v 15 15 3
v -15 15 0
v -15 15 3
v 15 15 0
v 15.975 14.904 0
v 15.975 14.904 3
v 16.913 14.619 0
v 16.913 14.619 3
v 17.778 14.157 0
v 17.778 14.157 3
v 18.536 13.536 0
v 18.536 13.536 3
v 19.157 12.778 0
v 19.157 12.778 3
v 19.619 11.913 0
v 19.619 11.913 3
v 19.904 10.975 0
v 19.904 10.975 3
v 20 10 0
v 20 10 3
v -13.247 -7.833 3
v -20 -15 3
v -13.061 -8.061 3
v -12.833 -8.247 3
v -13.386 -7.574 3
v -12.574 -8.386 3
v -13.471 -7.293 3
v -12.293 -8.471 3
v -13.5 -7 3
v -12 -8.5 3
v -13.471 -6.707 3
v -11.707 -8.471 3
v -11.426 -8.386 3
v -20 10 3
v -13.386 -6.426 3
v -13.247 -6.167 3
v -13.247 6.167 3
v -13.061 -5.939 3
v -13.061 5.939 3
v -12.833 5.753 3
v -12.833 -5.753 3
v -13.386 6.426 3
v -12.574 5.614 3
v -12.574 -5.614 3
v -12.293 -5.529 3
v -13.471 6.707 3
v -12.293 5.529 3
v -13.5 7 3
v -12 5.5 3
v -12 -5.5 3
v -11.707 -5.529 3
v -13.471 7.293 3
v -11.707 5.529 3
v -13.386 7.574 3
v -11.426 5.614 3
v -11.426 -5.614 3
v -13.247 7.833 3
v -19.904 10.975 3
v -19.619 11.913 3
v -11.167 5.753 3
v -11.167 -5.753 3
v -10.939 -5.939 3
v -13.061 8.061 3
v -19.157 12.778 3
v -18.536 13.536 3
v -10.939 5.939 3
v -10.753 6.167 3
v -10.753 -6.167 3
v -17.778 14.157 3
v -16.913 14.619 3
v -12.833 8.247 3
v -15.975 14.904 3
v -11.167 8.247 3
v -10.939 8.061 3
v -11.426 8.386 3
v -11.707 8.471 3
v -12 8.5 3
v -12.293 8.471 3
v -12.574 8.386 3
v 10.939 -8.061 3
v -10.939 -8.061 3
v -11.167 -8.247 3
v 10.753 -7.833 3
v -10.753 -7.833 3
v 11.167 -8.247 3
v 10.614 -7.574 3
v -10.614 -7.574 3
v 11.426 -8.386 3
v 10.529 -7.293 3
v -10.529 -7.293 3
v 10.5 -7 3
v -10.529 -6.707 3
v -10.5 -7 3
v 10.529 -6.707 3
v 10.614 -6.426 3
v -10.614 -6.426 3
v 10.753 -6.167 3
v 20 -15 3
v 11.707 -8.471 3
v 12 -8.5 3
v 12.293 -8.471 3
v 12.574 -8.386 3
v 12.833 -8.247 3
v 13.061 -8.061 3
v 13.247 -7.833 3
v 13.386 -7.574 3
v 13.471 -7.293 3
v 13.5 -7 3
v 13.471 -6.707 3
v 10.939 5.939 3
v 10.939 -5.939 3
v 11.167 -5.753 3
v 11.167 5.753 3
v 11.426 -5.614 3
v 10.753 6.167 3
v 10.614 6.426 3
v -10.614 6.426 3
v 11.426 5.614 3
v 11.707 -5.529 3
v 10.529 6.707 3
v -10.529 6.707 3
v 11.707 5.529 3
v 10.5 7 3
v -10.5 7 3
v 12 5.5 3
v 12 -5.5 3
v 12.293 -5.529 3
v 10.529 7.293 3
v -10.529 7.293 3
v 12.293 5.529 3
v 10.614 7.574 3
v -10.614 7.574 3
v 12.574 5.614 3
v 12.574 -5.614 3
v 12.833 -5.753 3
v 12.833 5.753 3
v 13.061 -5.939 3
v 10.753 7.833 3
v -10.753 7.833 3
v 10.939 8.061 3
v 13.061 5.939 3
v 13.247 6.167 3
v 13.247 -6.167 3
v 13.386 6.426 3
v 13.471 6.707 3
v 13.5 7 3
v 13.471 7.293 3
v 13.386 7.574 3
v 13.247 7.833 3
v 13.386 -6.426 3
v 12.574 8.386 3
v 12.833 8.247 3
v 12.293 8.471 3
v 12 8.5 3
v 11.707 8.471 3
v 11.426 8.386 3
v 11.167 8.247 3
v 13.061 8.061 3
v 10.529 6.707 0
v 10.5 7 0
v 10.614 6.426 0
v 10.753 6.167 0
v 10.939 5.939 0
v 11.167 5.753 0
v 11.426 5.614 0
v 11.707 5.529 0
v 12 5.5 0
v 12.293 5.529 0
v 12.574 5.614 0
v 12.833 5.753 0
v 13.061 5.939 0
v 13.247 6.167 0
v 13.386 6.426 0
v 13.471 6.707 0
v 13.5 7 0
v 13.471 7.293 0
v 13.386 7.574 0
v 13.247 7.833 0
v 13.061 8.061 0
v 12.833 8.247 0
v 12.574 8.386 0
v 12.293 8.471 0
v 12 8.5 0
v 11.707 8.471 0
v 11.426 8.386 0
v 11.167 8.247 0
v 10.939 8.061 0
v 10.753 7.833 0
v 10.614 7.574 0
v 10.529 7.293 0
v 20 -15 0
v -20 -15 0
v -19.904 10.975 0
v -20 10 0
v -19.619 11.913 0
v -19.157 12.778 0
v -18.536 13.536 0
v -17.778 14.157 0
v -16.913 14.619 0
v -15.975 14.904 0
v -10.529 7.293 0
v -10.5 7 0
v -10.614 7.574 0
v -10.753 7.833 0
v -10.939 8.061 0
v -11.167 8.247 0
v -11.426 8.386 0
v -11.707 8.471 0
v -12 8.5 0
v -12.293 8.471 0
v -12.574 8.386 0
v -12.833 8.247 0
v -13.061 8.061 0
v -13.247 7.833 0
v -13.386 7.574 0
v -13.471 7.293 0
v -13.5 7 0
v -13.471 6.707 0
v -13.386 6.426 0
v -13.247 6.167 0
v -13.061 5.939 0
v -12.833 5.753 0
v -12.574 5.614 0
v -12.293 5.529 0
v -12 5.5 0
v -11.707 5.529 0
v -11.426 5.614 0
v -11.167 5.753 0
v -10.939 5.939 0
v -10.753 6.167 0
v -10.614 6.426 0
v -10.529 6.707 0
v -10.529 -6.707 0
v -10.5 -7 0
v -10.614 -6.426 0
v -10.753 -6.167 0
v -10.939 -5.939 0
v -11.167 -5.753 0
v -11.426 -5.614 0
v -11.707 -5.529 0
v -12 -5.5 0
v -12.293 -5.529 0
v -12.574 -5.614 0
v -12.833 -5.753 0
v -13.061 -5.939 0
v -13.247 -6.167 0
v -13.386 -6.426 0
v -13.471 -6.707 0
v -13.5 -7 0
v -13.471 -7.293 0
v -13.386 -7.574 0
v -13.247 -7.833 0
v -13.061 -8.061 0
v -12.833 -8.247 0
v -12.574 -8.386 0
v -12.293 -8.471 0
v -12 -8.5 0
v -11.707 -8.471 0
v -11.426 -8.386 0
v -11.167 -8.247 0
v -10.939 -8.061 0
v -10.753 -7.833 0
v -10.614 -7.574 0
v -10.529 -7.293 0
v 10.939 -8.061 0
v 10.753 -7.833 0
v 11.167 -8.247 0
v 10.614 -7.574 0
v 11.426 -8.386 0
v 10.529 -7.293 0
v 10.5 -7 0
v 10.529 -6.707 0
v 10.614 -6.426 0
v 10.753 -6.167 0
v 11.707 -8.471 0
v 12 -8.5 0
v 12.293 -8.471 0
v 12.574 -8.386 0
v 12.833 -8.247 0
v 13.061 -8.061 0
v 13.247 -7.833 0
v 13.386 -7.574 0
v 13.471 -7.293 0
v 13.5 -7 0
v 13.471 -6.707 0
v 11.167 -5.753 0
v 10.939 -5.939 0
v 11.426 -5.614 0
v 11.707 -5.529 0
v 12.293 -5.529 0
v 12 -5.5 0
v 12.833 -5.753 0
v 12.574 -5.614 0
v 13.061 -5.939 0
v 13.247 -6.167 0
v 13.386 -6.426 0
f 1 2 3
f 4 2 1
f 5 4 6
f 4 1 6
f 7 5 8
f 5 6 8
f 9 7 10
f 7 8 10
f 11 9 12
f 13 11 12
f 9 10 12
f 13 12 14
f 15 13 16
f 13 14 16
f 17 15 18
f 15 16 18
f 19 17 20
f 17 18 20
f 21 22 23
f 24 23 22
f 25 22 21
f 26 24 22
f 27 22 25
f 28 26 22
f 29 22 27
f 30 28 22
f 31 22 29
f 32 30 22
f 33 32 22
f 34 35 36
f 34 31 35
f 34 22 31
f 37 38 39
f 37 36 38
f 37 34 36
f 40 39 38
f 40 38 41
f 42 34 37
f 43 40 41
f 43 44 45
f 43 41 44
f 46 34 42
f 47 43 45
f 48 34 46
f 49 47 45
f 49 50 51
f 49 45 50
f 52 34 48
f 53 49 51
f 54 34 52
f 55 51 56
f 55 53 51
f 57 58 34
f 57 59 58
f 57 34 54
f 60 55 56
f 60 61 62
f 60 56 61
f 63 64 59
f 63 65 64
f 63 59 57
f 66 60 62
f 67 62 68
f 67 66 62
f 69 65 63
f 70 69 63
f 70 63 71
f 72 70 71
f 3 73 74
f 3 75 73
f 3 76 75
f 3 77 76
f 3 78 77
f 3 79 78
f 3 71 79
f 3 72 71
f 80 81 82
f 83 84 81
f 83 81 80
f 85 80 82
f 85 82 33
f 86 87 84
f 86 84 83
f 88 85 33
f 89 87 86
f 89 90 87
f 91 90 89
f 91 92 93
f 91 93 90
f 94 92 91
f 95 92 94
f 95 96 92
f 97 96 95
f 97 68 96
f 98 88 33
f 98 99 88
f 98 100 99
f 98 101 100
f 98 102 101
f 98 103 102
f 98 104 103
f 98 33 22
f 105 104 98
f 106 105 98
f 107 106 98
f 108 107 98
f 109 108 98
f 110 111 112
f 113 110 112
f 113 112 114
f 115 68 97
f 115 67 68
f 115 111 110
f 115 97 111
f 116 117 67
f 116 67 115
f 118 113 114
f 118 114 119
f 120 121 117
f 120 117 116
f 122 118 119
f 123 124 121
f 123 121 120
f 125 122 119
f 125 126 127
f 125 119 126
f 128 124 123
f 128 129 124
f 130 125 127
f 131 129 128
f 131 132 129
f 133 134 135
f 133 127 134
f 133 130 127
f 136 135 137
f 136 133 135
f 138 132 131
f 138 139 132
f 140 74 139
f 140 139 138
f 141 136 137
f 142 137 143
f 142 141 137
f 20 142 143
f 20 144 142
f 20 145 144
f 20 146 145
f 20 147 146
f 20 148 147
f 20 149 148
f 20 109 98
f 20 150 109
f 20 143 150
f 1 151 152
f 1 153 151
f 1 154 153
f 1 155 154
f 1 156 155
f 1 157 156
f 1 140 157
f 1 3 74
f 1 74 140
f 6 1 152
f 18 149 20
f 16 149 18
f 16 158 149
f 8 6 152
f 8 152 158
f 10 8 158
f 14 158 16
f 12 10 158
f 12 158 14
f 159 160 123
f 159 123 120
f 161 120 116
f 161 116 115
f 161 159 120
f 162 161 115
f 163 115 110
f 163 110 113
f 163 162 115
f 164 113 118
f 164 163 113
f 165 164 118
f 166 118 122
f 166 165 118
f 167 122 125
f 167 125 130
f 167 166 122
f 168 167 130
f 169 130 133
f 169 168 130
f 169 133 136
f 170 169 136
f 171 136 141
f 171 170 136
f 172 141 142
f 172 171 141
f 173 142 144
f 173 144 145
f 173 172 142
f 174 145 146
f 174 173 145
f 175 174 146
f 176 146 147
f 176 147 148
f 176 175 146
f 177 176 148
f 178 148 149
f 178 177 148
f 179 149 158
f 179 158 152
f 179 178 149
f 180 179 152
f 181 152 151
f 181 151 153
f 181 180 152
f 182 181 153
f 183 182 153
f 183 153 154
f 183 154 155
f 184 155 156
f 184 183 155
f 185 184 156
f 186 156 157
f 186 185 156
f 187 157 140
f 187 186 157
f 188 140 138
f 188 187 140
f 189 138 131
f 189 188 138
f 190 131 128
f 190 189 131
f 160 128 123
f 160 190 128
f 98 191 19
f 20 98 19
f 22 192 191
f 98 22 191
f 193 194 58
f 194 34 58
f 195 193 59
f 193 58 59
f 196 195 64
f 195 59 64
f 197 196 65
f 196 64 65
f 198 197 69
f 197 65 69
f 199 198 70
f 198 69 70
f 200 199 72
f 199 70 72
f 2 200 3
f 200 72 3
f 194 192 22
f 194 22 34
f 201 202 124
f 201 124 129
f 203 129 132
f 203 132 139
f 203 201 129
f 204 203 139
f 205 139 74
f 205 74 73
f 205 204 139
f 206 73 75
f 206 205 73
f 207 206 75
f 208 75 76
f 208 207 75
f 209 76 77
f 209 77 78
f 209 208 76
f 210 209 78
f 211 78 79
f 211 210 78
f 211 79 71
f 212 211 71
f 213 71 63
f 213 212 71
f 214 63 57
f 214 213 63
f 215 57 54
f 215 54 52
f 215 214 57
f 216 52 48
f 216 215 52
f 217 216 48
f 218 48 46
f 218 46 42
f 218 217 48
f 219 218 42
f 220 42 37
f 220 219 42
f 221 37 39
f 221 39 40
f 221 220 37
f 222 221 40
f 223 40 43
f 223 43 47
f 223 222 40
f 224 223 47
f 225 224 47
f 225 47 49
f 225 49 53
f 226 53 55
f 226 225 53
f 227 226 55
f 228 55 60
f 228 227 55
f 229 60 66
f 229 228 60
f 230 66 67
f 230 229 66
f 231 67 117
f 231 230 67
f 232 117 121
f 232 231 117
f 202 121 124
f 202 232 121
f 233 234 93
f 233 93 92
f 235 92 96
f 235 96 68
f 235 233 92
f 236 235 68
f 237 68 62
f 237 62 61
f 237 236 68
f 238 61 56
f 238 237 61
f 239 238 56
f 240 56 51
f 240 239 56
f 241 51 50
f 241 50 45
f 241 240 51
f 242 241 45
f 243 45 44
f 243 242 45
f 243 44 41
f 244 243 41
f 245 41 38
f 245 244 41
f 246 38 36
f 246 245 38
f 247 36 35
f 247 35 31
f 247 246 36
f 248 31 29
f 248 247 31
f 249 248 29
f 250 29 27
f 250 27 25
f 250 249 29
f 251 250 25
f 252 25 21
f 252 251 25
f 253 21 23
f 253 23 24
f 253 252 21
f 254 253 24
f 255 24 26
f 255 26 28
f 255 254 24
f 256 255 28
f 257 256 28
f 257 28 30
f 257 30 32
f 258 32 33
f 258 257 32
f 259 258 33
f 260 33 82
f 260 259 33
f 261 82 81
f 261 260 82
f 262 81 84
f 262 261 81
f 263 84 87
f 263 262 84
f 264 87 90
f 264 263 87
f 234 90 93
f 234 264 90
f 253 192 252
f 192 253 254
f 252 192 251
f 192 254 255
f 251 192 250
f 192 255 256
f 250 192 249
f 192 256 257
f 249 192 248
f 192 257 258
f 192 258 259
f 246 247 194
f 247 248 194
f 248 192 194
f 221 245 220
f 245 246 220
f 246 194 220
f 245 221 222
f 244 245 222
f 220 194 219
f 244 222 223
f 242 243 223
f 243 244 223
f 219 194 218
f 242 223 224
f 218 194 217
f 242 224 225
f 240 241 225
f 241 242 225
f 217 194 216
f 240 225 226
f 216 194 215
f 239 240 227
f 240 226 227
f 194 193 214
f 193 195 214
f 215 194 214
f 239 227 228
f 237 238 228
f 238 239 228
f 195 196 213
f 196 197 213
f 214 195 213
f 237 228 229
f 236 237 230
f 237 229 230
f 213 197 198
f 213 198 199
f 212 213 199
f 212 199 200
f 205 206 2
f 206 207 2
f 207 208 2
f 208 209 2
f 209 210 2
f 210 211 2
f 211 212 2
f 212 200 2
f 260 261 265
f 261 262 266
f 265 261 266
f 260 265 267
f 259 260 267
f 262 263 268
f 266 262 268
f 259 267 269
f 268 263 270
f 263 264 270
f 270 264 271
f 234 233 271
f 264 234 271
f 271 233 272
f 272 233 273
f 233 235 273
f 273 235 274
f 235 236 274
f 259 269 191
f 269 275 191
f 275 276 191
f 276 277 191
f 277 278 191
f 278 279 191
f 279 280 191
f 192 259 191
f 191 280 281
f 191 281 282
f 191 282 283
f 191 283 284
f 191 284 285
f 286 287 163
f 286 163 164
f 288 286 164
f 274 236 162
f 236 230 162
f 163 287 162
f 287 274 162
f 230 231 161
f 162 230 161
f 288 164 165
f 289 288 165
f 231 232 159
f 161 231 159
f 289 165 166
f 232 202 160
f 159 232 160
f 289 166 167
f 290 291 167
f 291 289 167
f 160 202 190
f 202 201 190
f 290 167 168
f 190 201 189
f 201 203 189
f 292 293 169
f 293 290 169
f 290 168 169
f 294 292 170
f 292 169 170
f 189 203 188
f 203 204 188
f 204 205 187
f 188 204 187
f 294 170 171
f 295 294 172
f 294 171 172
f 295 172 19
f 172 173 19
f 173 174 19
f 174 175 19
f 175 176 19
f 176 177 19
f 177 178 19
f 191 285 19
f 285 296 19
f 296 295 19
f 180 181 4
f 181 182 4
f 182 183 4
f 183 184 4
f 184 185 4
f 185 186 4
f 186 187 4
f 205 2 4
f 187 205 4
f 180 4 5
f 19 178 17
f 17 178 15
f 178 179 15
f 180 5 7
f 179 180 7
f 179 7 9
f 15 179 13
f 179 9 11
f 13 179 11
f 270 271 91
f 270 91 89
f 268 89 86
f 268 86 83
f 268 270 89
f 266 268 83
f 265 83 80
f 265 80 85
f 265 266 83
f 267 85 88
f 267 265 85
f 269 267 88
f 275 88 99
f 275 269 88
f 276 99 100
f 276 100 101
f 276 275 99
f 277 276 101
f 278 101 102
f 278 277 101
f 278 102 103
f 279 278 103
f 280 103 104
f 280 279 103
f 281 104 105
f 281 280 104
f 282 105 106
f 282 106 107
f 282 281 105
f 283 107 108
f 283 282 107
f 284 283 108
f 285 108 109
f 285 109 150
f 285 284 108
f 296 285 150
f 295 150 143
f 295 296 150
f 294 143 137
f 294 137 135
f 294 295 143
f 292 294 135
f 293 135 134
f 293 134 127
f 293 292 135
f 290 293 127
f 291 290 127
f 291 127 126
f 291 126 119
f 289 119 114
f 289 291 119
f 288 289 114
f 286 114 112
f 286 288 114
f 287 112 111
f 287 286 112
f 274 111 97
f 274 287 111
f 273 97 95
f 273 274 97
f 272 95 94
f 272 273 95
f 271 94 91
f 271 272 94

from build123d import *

# Parameters (mm, degrees)
SKETCH_1_W      = 40
SKETCH_1_H      = 30
SKETCH_1_R      = 1.5
EXTRUDE_1_DEPTH = 3
FILLET_1_R      = 5


with BuildPart() as part:
    # 草圖1 → 填料-伸長1 (new body)
    with BuildSketch(Plane.XY):
        Rectangle(SKETCH_1_W, SKETCH_1_H)
        with Locations((-12, 7)):
            Circle(SKETCH_1_R, mode=Mode.SUBTRACT)
        with Locations((-12, -7)):
            Circle(SKETCH_1_R, mode=Mode.SUBTRACT)
        with Locations(Location((12, -7, 0), (0, 0, 180))):
            Circle(SKETCH_1_R, mode=Mode.SUBTRACT)
        with Locations(Location((12, 7, 0), (0, 0, 180))):
            Circle(SKETCH_1_R, mode=Mode.SUBTRACT)
    extrude(amount=EXTRUDE_1_DEPTH)

    # 圓角1
    fillet_1_edges = [part.edges().sort_by_distance(p)[0] for p in [
        (-20, 15, 1.5),
        (20, 15, 1.5),
    ]]
    fillet(fillet_1_edges, radius=FILLET_1_R)


solid = part.part
